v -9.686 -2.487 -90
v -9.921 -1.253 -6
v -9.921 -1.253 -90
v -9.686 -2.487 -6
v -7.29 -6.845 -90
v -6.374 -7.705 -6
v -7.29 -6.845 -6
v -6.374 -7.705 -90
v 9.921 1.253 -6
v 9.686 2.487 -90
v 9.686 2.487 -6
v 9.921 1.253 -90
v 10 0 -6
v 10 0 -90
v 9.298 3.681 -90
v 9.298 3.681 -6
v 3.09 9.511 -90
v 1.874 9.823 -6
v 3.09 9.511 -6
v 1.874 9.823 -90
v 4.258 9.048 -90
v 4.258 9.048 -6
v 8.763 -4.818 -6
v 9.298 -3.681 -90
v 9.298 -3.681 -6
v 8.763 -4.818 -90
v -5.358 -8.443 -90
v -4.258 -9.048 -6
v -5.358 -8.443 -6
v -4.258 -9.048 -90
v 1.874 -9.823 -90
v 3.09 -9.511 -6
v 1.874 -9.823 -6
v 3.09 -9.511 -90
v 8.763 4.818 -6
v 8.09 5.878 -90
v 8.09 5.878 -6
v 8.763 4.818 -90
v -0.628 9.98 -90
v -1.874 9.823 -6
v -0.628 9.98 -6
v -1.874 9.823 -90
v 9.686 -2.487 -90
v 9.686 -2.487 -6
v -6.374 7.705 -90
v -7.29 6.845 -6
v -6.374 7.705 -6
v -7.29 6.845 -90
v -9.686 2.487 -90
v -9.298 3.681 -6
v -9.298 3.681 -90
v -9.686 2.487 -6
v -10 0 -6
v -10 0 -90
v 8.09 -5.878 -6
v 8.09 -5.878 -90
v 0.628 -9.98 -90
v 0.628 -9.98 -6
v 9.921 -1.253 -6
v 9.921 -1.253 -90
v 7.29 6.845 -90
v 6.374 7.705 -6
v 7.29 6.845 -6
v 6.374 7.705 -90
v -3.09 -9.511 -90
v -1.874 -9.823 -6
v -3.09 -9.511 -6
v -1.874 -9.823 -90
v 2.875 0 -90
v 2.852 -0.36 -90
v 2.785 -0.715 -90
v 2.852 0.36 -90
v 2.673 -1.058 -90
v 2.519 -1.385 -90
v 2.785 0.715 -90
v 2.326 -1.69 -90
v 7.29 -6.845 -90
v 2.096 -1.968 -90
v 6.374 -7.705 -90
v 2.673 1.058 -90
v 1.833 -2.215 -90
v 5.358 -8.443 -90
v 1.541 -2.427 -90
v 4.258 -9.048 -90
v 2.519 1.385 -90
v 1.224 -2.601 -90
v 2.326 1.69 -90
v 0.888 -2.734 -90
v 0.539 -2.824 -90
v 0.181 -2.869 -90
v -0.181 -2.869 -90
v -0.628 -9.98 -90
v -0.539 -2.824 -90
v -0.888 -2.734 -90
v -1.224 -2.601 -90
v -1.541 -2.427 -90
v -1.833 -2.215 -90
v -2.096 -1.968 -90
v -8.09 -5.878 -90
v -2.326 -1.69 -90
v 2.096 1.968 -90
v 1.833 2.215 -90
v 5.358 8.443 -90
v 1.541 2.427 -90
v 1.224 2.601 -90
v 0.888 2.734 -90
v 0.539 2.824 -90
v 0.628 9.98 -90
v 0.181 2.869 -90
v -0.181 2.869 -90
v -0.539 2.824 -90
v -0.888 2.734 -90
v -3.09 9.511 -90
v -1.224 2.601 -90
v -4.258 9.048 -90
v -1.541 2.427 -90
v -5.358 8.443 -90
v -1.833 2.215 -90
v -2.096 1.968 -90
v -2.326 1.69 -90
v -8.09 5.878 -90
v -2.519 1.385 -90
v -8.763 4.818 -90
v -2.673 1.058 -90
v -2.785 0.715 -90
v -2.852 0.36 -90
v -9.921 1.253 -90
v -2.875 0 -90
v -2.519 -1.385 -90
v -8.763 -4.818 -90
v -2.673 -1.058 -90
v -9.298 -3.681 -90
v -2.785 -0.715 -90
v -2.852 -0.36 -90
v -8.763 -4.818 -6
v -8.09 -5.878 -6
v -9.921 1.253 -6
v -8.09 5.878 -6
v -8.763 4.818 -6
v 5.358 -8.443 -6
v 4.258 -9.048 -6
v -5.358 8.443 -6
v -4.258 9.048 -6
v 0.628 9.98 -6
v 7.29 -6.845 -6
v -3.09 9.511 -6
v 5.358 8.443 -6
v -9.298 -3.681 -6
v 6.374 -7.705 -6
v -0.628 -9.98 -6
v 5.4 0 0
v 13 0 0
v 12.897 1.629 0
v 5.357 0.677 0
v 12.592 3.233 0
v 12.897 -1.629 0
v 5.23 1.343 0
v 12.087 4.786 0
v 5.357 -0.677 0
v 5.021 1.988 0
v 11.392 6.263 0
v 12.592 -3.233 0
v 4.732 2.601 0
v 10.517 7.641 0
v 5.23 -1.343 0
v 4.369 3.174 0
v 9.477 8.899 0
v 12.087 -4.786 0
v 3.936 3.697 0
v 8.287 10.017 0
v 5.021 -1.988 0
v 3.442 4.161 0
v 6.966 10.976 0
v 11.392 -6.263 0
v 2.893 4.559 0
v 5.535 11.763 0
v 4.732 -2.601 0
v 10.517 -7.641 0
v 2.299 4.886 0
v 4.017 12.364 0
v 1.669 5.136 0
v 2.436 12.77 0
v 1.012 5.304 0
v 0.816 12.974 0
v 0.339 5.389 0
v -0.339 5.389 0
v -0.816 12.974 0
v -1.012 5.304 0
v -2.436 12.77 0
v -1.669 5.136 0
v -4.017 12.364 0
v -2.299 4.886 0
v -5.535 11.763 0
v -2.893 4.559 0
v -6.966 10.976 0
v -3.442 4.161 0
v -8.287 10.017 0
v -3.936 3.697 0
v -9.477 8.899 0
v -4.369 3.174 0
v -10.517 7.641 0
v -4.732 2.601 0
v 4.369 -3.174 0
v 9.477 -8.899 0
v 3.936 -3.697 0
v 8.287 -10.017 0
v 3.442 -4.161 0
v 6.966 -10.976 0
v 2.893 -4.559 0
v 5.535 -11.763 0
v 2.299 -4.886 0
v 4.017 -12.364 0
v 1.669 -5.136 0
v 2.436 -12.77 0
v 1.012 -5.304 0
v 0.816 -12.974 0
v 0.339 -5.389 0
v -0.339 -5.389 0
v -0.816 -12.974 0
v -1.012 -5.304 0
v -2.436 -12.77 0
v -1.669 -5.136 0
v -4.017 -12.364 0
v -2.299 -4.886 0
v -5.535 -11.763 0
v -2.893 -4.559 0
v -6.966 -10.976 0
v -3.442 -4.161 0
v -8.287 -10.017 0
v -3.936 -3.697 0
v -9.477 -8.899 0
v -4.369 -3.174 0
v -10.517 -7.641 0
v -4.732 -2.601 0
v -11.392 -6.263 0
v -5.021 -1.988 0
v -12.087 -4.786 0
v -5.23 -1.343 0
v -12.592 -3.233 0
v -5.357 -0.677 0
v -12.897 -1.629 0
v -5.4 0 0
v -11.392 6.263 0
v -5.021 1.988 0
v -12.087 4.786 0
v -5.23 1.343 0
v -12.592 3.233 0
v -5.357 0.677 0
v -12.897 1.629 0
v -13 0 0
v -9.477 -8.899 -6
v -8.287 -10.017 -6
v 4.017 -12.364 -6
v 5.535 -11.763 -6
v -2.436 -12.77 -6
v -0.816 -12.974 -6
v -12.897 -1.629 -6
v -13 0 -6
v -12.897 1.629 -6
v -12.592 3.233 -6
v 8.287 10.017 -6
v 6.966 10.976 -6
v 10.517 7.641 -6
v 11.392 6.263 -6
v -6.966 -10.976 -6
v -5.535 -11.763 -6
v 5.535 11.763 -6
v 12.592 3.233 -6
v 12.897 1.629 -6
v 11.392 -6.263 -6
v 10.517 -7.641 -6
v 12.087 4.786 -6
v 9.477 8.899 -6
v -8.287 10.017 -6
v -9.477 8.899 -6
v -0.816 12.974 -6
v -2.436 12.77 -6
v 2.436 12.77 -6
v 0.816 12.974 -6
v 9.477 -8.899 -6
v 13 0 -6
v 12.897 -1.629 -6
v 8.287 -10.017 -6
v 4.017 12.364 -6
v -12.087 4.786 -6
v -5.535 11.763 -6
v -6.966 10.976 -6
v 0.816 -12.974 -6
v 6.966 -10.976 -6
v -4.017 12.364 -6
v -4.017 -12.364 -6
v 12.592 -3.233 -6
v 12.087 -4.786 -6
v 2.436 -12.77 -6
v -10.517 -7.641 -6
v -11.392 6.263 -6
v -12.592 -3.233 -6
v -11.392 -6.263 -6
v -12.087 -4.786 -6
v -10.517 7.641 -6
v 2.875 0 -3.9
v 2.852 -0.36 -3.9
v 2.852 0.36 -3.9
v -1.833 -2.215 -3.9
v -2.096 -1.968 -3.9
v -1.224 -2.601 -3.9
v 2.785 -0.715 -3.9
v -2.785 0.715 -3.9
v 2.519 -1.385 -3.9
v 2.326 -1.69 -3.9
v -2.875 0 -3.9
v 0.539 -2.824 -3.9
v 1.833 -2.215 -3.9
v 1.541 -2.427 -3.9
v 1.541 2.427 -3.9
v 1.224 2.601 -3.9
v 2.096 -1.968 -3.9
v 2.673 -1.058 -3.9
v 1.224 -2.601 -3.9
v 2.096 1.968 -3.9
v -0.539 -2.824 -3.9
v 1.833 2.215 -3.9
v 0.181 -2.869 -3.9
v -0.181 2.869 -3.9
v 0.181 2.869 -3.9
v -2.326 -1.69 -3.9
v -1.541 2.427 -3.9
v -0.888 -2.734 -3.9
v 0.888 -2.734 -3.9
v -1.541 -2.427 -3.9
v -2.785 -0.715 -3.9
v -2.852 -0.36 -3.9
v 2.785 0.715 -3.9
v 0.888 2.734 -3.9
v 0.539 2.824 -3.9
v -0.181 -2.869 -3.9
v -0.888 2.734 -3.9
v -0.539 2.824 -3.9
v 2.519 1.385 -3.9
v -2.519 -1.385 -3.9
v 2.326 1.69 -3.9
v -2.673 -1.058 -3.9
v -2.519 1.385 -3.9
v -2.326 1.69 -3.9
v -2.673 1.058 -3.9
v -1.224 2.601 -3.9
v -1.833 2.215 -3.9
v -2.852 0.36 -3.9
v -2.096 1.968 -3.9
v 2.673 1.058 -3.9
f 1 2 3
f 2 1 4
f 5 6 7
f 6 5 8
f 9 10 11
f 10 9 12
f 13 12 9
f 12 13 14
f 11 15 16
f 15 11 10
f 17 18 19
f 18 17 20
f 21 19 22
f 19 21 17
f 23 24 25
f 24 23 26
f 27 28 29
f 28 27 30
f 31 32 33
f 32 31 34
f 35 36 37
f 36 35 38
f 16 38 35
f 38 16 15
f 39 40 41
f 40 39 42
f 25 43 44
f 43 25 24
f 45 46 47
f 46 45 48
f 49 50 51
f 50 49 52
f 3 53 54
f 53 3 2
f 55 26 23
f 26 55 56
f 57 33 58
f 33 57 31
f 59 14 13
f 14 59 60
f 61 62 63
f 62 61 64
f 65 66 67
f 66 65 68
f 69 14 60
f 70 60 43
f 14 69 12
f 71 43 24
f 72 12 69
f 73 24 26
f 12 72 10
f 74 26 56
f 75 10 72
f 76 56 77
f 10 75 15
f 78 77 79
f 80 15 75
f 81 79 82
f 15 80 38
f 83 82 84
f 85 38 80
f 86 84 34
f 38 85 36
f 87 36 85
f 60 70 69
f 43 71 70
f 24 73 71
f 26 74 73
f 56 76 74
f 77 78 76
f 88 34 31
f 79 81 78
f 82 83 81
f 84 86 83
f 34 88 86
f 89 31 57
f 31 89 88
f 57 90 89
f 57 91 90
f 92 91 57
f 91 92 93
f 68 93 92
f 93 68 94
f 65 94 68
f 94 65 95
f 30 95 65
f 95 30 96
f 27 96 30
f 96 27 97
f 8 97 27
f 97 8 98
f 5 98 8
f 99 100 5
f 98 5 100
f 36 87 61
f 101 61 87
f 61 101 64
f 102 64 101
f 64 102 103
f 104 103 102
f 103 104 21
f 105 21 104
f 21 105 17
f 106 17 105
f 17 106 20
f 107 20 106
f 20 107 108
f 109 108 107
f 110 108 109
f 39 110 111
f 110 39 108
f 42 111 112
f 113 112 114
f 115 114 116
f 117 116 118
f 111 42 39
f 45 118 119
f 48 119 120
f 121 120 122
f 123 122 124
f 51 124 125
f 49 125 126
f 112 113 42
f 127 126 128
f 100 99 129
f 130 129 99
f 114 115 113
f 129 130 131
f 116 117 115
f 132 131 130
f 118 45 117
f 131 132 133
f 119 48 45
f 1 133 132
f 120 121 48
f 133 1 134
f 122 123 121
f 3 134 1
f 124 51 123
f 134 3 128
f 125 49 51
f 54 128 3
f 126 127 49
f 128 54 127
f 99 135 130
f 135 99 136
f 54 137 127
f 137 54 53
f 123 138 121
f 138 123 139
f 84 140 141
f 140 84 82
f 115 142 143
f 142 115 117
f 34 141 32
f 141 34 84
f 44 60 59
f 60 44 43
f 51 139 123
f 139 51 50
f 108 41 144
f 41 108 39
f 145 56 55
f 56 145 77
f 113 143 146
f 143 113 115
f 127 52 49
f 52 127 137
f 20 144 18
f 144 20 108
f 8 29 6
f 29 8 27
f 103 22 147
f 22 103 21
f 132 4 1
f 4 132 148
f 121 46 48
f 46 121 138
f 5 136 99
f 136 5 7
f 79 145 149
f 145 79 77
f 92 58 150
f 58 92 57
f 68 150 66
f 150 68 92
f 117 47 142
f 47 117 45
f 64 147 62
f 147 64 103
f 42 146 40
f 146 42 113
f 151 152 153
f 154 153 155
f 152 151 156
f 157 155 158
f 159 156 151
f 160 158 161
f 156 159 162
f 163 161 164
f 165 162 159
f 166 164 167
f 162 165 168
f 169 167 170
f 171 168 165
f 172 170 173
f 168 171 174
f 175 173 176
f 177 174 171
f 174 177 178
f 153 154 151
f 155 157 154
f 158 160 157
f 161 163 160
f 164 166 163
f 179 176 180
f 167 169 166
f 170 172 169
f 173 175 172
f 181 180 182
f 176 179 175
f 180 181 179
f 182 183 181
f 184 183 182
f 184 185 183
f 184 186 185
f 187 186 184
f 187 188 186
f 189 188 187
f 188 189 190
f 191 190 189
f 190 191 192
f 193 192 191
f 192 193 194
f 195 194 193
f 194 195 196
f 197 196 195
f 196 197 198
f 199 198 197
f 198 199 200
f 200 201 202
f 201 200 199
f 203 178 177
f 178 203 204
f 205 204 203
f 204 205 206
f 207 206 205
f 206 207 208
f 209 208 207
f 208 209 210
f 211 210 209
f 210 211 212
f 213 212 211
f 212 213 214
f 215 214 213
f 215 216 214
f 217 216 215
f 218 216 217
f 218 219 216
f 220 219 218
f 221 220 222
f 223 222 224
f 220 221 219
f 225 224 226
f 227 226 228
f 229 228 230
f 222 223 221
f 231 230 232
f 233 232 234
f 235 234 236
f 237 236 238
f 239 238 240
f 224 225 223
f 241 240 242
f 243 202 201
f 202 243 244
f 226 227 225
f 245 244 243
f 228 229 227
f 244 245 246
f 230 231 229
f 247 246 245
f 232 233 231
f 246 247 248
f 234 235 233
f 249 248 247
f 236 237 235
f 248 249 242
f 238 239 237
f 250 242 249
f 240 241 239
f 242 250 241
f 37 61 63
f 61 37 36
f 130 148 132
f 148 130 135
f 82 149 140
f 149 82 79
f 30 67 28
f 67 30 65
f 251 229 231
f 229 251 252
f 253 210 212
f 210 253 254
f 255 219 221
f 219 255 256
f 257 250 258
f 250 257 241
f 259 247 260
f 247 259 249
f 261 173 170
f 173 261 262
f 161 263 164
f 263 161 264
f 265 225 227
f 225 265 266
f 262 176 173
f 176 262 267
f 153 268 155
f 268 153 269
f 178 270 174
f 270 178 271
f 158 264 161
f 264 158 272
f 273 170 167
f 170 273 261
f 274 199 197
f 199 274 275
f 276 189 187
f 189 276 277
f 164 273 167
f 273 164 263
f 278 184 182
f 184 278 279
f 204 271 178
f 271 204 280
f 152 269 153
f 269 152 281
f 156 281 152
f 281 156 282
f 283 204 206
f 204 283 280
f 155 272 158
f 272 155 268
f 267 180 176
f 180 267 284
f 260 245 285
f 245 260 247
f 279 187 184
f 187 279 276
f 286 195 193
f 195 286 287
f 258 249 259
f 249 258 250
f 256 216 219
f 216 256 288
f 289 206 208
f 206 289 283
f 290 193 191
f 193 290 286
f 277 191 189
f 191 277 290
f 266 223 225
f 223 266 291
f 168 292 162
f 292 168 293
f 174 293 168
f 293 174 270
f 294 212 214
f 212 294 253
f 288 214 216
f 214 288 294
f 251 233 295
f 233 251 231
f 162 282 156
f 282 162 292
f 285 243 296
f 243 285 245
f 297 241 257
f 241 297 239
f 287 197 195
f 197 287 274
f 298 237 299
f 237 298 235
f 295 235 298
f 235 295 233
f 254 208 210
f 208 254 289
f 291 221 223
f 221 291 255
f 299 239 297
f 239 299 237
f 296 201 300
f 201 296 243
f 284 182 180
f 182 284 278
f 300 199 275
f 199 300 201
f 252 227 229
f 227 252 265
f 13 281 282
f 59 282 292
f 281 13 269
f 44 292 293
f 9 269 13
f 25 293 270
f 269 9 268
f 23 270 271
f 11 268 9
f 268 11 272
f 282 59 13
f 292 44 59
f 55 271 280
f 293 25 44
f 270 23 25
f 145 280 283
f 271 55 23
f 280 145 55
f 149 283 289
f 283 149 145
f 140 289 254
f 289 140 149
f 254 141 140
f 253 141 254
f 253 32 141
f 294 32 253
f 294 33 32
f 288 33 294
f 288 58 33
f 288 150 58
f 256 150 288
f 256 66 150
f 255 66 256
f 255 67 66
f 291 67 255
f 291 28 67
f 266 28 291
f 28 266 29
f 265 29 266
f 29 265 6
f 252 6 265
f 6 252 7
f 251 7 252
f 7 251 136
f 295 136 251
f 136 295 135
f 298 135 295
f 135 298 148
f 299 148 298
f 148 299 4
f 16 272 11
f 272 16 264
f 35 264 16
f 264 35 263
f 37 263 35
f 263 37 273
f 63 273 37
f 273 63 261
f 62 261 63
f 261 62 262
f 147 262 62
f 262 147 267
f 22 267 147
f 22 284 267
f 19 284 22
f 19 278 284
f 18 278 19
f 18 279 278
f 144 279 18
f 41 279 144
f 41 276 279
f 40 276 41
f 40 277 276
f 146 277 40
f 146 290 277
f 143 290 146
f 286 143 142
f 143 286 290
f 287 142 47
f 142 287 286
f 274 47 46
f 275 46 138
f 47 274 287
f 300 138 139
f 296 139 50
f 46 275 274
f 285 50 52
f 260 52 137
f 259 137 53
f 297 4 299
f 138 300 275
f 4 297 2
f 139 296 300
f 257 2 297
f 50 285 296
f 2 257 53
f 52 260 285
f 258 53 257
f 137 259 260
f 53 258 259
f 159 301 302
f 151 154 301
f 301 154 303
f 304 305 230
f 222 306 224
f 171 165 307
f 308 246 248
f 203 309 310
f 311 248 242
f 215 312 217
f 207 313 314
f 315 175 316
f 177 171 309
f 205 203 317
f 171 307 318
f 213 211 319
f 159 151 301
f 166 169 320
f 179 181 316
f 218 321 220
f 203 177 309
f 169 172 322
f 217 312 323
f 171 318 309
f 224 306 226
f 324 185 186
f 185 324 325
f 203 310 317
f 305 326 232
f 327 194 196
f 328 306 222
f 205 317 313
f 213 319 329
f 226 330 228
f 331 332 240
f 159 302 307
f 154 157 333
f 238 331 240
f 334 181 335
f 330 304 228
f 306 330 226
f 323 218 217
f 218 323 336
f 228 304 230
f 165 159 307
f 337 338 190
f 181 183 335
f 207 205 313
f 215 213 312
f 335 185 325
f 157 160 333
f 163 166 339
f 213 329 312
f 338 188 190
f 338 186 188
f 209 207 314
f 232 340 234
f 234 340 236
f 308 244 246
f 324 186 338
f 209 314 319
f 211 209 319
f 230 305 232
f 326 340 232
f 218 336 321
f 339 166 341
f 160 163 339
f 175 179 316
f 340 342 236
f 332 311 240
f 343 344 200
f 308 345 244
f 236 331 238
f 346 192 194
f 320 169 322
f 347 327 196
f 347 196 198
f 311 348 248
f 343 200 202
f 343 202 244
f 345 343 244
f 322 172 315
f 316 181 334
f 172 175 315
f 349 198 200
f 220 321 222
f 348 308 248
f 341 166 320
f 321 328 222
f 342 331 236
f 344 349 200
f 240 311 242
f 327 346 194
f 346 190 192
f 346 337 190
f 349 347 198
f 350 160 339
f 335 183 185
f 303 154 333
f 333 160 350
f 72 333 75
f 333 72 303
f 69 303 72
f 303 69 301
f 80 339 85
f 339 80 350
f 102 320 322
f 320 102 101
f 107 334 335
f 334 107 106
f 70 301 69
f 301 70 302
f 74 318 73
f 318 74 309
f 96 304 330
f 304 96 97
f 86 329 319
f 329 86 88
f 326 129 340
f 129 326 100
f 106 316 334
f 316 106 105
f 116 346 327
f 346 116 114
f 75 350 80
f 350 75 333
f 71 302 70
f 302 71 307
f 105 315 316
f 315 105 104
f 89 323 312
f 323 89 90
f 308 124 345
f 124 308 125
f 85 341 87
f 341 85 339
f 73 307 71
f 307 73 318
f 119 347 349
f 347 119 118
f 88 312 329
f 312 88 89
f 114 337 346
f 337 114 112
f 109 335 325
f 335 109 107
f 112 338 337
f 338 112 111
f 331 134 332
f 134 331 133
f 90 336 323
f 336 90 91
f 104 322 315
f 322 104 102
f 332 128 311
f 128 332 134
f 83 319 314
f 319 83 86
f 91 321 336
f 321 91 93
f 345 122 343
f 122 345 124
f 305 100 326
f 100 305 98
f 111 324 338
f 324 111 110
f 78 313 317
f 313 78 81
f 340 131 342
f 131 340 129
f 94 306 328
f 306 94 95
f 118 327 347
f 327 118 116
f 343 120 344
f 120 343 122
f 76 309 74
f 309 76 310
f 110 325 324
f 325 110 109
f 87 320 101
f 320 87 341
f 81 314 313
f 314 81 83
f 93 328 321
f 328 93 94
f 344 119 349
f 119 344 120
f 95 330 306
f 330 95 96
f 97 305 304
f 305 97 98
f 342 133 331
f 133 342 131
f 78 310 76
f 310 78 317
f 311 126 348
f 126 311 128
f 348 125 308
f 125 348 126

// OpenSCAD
$fn = 50;


difference() {
	union() {
		translate(v = [0, 0, -90.0000000000]) {
			cylinder(h = 90, r = 10.0000000000);
		}
		translate(v = [0, 0, -6.0000000000]) {
			cylinder(h = 6, r = 13.0000000000);
		}
	}
	union() {
		translate(v = [0, 0, 0]) {
			rotate(a = [0, 0, 0]) {
				difference() {
					union() {
						#translate(v = [0, 0, -90.0000000000]) {
							cylinder(h = 90, r = 2.6000000000);
						}
						#translate(v = [0, 0, -3.9000000000]) {
							cylinder(h = 3.9000000000, r1 = 2.8750000000, r2 = 5.4000000000);
						}
						#translate(v = [0, 0, -90.0000000000]) {
							cylinder(h = 90, r = 2.8750000000);
						}
						#translate(v = [0, 0, -90.0000000000]) {
							cylinder(h = 90, r = 2.6000000000);
						}
					}
					union();
				}
			}
		}
	}
}
